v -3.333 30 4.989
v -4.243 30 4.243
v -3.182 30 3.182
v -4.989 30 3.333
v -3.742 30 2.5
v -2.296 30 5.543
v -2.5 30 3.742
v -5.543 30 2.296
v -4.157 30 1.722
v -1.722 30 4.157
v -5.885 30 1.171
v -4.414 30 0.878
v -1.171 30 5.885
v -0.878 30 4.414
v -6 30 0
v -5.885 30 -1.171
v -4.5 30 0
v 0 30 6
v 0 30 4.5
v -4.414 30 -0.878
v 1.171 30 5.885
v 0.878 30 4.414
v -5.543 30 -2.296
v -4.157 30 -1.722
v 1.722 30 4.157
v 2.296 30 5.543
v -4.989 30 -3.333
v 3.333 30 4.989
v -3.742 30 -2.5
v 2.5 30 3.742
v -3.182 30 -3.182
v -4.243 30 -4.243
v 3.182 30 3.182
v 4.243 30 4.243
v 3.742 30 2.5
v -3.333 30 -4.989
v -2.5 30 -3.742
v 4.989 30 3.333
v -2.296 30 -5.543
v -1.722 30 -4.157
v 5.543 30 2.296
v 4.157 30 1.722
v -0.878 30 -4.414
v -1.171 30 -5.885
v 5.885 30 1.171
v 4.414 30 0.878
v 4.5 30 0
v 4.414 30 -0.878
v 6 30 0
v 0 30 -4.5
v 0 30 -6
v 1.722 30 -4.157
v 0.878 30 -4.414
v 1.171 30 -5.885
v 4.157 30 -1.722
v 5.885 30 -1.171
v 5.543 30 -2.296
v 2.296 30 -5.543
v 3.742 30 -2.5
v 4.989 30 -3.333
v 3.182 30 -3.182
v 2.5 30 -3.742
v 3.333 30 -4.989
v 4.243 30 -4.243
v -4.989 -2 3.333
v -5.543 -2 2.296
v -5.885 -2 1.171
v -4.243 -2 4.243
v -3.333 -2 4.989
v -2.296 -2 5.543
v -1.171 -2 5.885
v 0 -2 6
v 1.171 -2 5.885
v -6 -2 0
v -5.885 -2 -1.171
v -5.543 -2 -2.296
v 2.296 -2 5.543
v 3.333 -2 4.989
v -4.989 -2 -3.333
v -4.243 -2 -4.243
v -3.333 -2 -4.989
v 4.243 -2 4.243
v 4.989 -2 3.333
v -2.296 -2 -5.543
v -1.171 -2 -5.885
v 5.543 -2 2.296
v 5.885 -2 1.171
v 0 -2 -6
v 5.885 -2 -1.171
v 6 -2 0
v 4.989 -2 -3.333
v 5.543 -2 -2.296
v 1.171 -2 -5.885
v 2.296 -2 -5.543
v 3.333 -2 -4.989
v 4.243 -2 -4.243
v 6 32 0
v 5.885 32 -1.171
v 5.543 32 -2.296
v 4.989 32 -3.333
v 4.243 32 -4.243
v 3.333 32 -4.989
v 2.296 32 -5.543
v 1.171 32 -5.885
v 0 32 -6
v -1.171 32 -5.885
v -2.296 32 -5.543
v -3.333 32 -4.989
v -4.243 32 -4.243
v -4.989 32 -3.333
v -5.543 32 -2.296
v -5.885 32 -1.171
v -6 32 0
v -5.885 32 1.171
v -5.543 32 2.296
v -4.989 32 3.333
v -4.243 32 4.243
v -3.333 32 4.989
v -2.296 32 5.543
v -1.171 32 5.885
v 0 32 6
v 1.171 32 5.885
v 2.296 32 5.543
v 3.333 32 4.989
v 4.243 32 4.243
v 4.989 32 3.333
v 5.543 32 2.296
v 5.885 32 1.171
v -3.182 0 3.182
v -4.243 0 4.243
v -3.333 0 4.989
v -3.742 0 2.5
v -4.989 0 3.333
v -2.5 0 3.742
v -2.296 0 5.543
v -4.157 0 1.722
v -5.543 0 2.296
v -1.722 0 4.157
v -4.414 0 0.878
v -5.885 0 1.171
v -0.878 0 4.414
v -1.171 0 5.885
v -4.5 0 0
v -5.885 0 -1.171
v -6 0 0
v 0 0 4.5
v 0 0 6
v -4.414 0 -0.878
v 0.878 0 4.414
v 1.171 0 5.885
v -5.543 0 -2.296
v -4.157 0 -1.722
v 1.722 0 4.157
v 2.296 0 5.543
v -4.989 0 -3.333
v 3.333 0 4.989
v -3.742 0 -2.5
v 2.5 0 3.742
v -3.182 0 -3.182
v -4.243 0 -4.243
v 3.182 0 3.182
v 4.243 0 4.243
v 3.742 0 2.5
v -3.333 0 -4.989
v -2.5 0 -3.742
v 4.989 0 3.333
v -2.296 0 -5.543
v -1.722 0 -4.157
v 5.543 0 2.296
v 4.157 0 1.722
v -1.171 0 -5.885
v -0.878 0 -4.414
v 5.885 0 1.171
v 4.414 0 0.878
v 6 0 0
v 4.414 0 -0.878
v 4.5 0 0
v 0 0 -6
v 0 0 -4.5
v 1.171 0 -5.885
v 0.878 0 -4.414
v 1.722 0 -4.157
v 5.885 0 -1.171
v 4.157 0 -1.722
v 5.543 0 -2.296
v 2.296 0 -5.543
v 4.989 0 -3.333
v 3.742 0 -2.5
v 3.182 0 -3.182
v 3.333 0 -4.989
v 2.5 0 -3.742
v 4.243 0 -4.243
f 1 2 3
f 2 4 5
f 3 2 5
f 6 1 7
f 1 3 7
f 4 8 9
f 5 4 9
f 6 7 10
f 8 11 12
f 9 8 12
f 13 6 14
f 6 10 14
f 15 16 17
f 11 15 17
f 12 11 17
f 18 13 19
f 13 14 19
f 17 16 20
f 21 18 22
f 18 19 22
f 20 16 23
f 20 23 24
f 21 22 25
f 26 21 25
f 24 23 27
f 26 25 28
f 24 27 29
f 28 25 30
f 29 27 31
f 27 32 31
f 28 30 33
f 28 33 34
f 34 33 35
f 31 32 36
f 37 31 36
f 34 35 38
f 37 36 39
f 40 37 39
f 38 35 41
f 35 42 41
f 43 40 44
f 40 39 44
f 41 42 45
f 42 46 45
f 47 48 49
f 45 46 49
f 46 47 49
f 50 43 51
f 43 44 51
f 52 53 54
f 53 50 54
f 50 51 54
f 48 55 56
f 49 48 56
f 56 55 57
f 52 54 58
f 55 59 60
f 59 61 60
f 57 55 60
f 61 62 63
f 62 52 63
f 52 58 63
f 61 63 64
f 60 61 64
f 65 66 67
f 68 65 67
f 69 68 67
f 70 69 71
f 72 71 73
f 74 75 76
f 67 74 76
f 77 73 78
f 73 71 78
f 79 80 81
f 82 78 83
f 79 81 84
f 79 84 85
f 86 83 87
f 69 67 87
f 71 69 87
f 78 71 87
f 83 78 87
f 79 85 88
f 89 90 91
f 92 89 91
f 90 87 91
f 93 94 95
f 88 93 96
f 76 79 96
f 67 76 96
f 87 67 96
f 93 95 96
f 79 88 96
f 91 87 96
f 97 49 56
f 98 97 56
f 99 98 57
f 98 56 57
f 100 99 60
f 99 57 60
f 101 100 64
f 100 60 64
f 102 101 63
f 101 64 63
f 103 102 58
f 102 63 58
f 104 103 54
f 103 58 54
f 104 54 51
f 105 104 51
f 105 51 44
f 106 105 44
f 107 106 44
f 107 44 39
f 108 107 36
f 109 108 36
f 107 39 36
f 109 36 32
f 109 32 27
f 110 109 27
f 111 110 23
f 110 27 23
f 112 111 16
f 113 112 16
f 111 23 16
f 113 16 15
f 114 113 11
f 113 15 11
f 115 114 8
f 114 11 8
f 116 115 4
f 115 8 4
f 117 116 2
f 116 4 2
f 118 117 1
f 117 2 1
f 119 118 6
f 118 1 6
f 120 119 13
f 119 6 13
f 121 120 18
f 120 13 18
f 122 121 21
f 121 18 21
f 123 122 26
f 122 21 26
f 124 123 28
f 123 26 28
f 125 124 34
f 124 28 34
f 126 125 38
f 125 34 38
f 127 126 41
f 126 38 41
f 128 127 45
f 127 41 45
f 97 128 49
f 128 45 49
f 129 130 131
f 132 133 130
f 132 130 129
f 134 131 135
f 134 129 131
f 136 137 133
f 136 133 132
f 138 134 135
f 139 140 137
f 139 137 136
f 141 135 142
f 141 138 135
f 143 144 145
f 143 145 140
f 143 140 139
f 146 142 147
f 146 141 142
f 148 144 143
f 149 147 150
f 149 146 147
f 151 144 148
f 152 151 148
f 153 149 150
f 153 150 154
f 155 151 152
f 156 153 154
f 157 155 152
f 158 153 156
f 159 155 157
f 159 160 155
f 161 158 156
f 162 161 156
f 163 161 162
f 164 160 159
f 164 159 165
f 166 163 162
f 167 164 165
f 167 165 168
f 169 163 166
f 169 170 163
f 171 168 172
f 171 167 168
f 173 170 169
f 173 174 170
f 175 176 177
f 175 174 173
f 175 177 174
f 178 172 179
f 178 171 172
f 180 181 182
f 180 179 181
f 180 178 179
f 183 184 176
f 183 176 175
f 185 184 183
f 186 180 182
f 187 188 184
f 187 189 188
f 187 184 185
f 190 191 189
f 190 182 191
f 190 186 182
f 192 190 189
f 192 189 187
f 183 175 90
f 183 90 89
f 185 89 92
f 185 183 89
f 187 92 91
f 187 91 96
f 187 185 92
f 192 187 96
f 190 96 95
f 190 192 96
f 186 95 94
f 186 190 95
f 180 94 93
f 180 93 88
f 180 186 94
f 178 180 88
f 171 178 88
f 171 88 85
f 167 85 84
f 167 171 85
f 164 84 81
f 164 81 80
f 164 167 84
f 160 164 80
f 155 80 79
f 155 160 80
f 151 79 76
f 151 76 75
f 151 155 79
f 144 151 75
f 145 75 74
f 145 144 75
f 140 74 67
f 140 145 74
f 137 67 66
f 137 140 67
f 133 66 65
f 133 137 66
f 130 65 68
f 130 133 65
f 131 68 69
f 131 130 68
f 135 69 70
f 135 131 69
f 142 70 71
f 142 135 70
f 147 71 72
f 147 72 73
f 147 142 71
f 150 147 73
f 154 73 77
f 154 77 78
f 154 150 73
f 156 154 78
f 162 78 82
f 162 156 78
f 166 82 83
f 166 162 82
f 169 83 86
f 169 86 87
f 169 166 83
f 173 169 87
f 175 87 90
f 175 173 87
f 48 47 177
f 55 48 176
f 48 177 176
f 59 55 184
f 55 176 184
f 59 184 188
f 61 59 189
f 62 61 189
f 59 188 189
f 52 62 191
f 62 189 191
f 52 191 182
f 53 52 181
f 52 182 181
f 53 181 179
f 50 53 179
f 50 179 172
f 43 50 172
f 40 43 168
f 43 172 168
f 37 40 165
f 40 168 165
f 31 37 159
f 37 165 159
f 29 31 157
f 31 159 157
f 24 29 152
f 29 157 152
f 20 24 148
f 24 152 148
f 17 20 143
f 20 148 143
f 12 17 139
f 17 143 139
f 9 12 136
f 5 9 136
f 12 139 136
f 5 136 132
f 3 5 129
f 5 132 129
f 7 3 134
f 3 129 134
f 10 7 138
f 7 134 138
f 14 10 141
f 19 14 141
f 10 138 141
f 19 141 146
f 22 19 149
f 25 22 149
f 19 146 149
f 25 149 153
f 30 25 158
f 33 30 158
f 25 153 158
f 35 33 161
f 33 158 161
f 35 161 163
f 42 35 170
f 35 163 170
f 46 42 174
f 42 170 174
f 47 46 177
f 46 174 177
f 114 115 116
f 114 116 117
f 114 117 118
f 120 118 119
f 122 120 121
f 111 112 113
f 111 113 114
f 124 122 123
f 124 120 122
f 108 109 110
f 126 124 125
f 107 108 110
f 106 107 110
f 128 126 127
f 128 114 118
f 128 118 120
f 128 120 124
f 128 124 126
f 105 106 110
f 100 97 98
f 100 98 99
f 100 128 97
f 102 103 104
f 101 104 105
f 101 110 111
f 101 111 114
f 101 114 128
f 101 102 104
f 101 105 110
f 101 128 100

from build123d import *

# Parameters (mm, degrees)
SKETCH1_R           = 4.5
BOSS_EXTRUDE1_DEPTH = 30
SKETCH2_R           = 6
BOSS_EXTRUDE2_DEPTH = 2
SKETCH3_R           = 6
BOSS_EXTRUDE3_DEPTH = 2


with BuildPart() as part:
    # Sketch1 → Boss-Extrude1 (new body)
    with BuildSketch(Plane(origin=(0, 0, 0), x_dir=(1, 0, 0), z_dir=(0, 1, 0))):
        Circle(SKETCH1_R)
    extrude(amount=BOSS_EXTRUDE1_DEPTH)

    # Sketch2 → Boss-Extrude2 (add)
    with BuildSketch(Plane(origin=(0, 0, 0), x_dir=(1, 0, 0), z_dir=(0, 1, 0))):
        Circle(SKETCH2_R)
    extrude(amount=-BOSS_EXTRUDE2_DEPTH)

    # Sketch3 → Boss-Extrude3 (add)
    with BuildSketch(Plane(origin=(0, 30, 0), x_dir=(1, 0, 0), z_dir=(0, 1, 0))):
        Circle(SKETCH3_R)
    extrude(amount=BOSS_EXTRUDE3_DEPTH)


solid = part.part
